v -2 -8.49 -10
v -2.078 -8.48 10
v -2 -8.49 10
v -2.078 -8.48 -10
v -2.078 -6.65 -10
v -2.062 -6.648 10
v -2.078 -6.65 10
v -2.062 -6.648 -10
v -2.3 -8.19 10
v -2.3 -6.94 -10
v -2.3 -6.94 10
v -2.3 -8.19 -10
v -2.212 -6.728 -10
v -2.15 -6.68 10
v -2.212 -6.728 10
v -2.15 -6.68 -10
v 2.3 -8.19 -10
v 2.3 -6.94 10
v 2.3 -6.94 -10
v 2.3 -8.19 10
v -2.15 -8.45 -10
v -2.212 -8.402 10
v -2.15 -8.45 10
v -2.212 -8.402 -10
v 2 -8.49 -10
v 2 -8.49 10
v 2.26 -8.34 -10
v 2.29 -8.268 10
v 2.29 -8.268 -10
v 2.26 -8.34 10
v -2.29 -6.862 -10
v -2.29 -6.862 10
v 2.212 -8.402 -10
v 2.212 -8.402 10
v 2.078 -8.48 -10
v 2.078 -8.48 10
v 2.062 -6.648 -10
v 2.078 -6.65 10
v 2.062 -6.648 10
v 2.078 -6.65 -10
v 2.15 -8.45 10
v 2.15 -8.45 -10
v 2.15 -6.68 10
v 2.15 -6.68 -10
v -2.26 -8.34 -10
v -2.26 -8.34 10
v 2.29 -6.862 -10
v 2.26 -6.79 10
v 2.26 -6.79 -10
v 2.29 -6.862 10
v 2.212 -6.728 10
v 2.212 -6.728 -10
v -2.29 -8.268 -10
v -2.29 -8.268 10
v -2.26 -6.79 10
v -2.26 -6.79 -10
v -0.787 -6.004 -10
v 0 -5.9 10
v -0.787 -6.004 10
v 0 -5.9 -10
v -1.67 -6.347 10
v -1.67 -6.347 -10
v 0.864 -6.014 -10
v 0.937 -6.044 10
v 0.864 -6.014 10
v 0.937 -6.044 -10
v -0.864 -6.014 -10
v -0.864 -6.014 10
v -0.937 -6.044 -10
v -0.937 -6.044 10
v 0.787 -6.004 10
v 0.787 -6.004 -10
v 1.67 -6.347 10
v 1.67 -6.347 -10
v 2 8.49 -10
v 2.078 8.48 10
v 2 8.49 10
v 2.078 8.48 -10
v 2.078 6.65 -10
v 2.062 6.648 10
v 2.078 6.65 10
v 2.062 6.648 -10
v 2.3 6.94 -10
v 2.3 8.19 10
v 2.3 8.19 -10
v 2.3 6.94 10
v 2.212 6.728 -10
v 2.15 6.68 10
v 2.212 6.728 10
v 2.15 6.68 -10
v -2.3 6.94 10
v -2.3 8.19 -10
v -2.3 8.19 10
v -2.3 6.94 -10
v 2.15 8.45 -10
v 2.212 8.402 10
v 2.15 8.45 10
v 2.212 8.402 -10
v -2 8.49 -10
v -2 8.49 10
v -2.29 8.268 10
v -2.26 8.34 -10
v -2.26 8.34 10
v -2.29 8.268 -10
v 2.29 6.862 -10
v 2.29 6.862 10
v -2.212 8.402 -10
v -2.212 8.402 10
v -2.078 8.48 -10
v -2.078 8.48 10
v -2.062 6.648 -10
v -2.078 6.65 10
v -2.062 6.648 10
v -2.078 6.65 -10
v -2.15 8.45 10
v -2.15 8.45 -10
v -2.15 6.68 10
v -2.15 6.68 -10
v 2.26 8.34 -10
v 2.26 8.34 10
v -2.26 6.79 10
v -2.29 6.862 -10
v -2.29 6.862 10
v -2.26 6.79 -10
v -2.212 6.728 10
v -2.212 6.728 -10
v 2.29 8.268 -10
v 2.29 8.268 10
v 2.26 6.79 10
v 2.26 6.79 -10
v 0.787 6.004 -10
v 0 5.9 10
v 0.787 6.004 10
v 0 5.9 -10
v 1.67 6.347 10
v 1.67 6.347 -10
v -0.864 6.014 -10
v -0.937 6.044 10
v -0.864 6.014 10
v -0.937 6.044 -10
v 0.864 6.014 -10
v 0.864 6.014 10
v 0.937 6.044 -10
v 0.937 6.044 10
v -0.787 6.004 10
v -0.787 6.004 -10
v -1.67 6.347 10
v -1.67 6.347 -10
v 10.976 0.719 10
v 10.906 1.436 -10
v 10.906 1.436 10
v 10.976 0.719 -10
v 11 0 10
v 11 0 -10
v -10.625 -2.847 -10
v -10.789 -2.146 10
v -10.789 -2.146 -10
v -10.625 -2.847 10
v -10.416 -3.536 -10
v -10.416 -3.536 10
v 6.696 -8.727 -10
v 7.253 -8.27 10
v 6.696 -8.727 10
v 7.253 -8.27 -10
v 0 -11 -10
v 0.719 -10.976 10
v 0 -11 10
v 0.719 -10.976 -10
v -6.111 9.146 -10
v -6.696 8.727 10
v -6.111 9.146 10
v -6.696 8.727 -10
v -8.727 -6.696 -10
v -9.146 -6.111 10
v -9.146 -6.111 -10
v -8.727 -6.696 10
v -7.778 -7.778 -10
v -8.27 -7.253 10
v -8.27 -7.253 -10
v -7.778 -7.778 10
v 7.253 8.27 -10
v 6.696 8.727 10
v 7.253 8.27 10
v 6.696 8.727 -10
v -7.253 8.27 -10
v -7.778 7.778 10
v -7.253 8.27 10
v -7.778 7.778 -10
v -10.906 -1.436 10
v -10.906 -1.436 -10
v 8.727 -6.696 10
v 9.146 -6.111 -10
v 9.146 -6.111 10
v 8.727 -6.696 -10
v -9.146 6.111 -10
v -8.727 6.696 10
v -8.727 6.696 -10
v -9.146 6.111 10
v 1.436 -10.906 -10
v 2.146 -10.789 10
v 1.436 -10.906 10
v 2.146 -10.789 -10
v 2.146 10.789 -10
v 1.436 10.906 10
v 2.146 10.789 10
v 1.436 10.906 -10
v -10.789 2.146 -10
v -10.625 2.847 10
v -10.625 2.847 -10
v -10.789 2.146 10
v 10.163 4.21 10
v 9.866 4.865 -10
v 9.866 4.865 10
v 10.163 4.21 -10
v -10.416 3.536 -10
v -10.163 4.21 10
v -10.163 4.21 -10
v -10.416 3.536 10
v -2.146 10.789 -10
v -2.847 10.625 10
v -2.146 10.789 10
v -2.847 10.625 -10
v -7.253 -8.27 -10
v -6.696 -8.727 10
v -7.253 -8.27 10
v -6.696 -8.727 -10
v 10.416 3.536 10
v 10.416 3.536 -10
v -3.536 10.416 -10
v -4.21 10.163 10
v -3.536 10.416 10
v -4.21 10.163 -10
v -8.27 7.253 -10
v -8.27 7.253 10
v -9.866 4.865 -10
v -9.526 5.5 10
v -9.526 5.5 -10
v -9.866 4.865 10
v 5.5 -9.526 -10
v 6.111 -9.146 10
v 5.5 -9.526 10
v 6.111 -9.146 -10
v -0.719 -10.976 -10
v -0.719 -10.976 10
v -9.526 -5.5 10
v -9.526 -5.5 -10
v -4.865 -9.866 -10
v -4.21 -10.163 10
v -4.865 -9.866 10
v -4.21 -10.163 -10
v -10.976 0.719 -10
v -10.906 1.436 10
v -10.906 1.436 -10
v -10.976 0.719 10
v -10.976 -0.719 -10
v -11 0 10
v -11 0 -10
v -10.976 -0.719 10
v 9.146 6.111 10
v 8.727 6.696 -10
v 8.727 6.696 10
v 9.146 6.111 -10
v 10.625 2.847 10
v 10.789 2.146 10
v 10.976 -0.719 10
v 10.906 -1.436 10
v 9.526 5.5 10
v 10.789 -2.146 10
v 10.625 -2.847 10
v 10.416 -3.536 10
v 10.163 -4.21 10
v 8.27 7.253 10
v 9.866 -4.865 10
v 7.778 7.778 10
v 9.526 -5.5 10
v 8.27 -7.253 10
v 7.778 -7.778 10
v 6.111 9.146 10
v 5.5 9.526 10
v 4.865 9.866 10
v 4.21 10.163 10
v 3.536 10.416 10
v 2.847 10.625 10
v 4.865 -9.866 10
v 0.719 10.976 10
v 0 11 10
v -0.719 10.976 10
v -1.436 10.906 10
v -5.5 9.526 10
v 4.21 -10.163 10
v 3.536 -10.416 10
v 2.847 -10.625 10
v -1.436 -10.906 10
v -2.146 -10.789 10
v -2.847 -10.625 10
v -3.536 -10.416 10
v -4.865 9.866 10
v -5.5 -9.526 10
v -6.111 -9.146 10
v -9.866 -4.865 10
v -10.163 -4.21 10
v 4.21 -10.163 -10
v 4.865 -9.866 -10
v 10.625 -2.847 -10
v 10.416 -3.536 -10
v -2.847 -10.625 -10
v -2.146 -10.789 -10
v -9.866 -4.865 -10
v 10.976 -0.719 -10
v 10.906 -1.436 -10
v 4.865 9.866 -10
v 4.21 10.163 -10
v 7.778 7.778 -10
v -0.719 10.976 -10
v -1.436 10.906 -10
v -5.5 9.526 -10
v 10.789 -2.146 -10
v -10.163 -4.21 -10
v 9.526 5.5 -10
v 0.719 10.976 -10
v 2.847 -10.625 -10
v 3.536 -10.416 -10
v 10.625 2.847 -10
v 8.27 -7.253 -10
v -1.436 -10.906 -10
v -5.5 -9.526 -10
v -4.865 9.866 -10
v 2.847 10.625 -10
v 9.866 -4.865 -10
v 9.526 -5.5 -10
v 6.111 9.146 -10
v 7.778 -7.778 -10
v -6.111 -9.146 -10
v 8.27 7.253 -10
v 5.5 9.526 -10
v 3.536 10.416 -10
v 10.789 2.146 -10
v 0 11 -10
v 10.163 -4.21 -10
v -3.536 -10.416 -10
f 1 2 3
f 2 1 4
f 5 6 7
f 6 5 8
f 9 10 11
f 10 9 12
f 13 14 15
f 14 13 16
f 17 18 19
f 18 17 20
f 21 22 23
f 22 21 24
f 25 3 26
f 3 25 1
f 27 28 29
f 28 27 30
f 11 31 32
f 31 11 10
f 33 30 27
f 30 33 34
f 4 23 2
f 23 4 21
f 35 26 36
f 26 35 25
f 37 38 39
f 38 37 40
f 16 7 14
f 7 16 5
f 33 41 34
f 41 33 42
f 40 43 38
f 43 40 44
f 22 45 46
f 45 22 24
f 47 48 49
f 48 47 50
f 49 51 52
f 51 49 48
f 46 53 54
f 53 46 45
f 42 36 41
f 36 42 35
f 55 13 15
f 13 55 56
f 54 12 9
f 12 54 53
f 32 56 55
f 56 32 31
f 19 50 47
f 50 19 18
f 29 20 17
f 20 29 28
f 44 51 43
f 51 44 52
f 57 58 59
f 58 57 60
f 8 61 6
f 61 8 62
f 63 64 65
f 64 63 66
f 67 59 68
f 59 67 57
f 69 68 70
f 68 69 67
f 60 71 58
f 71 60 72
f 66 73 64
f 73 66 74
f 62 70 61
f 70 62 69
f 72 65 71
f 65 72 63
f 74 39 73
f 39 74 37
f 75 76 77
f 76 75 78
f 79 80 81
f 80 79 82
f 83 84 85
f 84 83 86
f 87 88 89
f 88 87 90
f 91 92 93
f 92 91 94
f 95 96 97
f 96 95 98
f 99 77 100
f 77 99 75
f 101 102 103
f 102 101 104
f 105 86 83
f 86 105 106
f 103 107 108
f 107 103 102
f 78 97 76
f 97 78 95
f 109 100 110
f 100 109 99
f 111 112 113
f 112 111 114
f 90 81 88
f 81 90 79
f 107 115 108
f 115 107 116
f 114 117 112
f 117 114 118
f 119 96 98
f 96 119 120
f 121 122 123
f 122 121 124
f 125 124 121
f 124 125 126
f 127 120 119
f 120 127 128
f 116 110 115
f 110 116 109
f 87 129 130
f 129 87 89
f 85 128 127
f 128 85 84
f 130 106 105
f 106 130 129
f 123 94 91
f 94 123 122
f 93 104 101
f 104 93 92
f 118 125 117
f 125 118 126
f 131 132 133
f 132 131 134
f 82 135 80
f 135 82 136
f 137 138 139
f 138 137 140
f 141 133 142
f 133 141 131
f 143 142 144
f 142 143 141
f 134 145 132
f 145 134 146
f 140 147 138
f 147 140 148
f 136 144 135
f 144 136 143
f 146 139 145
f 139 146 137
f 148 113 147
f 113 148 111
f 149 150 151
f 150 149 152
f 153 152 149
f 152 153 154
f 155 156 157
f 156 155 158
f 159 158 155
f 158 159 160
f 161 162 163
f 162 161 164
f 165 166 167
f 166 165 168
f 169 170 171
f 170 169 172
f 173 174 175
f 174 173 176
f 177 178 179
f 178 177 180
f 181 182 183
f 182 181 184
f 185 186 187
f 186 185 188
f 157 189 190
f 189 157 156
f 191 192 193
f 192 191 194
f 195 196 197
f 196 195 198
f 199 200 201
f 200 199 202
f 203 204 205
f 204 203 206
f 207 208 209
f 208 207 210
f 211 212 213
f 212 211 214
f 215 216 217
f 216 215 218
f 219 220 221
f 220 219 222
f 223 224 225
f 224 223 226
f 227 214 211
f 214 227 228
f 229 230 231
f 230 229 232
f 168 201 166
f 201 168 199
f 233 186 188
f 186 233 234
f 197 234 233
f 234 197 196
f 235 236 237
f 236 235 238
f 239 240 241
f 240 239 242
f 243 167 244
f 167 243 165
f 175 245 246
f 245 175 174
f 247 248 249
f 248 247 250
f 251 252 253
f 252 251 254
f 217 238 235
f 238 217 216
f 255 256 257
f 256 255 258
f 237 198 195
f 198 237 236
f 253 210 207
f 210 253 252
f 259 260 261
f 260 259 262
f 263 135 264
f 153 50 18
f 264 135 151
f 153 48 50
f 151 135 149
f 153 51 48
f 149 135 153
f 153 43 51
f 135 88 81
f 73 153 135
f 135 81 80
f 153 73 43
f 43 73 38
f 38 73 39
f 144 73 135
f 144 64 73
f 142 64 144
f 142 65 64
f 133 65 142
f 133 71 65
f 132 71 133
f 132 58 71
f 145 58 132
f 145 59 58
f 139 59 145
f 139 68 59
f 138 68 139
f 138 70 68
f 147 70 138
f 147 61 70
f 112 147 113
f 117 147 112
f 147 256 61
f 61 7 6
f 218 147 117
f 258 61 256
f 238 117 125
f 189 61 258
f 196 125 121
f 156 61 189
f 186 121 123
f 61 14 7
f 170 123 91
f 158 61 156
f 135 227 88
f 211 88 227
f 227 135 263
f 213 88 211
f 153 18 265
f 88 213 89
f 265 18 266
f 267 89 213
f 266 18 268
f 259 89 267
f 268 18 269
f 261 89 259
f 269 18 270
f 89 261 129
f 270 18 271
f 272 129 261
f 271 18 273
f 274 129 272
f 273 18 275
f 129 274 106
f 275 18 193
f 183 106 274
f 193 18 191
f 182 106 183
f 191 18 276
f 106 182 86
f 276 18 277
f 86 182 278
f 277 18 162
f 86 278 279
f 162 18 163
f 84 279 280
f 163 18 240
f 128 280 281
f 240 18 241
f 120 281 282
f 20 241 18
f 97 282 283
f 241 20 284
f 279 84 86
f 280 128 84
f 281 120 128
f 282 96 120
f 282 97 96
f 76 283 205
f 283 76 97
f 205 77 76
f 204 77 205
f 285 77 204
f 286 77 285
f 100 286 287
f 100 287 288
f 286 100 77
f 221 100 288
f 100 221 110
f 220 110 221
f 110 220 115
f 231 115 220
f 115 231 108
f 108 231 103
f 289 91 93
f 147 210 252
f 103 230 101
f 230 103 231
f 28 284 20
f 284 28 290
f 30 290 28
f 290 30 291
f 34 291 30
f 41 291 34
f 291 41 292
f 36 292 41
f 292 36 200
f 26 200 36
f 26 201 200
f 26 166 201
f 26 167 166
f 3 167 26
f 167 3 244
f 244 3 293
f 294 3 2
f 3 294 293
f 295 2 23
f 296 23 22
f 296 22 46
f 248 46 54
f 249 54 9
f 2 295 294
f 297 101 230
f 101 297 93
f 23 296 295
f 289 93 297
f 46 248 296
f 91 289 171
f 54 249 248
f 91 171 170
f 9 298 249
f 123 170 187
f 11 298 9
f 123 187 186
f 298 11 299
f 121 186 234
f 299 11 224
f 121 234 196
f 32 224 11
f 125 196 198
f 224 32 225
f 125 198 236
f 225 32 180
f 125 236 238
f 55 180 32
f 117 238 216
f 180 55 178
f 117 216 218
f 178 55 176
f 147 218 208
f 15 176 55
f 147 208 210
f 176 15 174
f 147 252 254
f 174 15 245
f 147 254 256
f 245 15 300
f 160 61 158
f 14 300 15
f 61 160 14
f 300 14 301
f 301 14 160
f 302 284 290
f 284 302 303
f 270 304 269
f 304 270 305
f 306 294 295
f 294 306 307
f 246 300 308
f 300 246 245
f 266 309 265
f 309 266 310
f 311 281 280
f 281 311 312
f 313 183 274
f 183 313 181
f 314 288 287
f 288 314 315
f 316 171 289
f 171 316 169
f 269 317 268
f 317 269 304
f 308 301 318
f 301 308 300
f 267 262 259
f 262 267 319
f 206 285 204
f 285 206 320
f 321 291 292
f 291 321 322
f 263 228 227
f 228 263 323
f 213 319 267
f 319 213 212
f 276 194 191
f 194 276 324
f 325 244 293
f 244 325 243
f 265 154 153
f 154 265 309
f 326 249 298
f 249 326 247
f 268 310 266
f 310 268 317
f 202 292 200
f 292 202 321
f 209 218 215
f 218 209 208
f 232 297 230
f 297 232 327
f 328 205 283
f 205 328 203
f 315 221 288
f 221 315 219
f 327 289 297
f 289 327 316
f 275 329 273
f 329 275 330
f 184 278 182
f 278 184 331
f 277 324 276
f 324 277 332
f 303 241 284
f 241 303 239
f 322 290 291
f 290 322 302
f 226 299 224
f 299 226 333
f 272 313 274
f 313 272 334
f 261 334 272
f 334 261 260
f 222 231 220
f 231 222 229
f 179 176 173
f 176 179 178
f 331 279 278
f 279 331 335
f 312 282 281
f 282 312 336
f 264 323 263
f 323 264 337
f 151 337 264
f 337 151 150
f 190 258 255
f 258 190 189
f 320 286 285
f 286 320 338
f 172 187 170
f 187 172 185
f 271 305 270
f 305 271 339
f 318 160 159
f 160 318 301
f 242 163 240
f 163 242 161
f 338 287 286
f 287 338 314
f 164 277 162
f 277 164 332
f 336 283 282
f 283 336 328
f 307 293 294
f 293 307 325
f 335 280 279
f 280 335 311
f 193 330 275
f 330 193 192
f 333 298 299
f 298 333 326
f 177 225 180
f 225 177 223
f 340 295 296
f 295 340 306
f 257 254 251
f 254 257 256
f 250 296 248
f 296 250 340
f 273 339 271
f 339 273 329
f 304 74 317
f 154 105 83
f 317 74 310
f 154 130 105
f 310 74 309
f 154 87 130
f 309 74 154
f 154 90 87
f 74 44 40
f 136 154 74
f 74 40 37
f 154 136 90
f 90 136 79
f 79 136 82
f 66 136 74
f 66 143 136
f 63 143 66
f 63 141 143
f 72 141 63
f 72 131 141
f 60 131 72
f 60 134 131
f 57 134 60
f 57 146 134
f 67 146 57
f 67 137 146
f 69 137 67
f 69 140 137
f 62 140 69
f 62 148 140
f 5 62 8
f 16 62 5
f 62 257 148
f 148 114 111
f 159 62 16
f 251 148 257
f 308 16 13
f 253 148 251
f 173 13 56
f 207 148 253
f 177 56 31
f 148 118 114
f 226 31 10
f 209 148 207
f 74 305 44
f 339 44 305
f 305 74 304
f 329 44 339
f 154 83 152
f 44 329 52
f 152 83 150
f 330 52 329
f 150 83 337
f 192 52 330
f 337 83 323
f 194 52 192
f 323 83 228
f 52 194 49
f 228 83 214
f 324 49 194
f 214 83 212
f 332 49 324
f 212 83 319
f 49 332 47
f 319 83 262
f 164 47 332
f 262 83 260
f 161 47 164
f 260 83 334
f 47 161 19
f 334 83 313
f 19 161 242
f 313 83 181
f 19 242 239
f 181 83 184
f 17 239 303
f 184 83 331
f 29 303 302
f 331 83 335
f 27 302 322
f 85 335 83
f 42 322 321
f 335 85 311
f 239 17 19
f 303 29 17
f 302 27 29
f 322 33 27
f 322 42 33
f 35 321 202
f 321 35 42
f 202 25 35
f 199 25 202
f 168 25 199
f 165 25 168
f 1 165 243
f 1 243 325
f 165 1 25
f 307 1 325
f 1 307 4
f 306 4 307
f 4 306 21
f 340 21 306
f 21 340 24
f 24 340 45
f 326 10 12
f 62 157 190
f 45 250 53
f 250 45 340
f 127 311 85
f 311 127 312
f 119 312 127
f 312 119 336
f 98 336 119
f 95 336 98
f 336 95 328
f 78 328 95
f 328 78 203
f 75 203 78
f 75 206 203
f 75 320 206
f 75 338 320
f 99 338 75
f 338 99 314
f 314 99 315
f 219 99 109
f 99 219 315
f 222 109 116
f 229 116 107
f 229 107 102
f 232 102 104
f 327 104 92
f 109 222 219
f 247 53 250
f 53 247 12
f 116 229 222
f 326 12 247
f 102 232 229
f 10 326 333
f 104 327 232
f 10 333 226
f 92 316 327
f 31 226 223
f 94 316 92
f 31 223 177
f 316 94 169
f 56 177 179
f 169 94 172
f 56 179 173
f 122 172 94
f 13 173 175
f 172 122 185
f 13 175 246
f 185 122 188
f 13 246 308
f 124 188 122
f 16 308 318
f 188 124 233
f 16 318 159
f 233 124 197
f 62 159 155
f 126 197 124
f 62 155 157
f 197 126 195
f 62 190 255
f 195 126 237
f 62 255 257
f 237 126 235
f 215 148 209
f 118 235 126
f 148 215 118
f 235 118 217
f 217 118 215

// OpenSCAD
// Simple clamp for unclipping a connector

// Copyright (C) 2020 Jeremy Bennett <jeremy@jeremybennett.com>

// Contributor Jeremy Bennett <jeremy@jeremybennett.com>

// SPDX-License-Identifier: CC-BY-SA-4.0

// We have a connector which needs two prongs 17 mm apart to release.


EPS = 0.01;
BLOCK_H = 20.0;
BLOCK_R = 11.0;
HOLE_H = BLOCK_H + 1.0;
HOLE_R = 3.04;
FLAT_H = 1.25;
ROUND_H = 2.0 - FLAT_H;
HOLE_W = 4.0;
SPIKE_GAP = 17.0;
MINK_PAD_R = 0.3;

module spike_hole () {
     translate (v = [0, ROUND_H - HOLE_R + FLAT_H + MINK_PAD_R, 0])
	  minkowski () {
               union () {
		    difference () {
			 cylinder (h = HOLE_H, r = HOLE_R, center = true,
				   $fn = 24);
			 translate (v = [0, -5 + HOLE_R - ROUND_H, 0])
			      cube (size = [10, 10, HOLE_H + EPS],
				    center = true);
		    }
		    translate (v = [0, HOLE_R - ROUND_H - FLAT_H / 2 + EPS, 0])
			 cube (size = [4.0, FLAT_H, HOLE_H], center = true);
	       }
	       cylinder (h = EPS, r = MINK_PAD_R, $fn = 24);
     }
}

module spike_holes () {
     translate (v = [0, -SPIKE_GAP / 2.0])
          spike_hole ();
     translate (v = [0, SPIKE_GAP / 2.0])
          rotate (a = [0, 0, 180])
               spike_hole ();
}

module block () {
     difference () {
	  cylinder (h = BLOCK_H, r = BLOCK_R, $fn = 96, center = true);
	  spike_holes ();
     }
}

block ();
